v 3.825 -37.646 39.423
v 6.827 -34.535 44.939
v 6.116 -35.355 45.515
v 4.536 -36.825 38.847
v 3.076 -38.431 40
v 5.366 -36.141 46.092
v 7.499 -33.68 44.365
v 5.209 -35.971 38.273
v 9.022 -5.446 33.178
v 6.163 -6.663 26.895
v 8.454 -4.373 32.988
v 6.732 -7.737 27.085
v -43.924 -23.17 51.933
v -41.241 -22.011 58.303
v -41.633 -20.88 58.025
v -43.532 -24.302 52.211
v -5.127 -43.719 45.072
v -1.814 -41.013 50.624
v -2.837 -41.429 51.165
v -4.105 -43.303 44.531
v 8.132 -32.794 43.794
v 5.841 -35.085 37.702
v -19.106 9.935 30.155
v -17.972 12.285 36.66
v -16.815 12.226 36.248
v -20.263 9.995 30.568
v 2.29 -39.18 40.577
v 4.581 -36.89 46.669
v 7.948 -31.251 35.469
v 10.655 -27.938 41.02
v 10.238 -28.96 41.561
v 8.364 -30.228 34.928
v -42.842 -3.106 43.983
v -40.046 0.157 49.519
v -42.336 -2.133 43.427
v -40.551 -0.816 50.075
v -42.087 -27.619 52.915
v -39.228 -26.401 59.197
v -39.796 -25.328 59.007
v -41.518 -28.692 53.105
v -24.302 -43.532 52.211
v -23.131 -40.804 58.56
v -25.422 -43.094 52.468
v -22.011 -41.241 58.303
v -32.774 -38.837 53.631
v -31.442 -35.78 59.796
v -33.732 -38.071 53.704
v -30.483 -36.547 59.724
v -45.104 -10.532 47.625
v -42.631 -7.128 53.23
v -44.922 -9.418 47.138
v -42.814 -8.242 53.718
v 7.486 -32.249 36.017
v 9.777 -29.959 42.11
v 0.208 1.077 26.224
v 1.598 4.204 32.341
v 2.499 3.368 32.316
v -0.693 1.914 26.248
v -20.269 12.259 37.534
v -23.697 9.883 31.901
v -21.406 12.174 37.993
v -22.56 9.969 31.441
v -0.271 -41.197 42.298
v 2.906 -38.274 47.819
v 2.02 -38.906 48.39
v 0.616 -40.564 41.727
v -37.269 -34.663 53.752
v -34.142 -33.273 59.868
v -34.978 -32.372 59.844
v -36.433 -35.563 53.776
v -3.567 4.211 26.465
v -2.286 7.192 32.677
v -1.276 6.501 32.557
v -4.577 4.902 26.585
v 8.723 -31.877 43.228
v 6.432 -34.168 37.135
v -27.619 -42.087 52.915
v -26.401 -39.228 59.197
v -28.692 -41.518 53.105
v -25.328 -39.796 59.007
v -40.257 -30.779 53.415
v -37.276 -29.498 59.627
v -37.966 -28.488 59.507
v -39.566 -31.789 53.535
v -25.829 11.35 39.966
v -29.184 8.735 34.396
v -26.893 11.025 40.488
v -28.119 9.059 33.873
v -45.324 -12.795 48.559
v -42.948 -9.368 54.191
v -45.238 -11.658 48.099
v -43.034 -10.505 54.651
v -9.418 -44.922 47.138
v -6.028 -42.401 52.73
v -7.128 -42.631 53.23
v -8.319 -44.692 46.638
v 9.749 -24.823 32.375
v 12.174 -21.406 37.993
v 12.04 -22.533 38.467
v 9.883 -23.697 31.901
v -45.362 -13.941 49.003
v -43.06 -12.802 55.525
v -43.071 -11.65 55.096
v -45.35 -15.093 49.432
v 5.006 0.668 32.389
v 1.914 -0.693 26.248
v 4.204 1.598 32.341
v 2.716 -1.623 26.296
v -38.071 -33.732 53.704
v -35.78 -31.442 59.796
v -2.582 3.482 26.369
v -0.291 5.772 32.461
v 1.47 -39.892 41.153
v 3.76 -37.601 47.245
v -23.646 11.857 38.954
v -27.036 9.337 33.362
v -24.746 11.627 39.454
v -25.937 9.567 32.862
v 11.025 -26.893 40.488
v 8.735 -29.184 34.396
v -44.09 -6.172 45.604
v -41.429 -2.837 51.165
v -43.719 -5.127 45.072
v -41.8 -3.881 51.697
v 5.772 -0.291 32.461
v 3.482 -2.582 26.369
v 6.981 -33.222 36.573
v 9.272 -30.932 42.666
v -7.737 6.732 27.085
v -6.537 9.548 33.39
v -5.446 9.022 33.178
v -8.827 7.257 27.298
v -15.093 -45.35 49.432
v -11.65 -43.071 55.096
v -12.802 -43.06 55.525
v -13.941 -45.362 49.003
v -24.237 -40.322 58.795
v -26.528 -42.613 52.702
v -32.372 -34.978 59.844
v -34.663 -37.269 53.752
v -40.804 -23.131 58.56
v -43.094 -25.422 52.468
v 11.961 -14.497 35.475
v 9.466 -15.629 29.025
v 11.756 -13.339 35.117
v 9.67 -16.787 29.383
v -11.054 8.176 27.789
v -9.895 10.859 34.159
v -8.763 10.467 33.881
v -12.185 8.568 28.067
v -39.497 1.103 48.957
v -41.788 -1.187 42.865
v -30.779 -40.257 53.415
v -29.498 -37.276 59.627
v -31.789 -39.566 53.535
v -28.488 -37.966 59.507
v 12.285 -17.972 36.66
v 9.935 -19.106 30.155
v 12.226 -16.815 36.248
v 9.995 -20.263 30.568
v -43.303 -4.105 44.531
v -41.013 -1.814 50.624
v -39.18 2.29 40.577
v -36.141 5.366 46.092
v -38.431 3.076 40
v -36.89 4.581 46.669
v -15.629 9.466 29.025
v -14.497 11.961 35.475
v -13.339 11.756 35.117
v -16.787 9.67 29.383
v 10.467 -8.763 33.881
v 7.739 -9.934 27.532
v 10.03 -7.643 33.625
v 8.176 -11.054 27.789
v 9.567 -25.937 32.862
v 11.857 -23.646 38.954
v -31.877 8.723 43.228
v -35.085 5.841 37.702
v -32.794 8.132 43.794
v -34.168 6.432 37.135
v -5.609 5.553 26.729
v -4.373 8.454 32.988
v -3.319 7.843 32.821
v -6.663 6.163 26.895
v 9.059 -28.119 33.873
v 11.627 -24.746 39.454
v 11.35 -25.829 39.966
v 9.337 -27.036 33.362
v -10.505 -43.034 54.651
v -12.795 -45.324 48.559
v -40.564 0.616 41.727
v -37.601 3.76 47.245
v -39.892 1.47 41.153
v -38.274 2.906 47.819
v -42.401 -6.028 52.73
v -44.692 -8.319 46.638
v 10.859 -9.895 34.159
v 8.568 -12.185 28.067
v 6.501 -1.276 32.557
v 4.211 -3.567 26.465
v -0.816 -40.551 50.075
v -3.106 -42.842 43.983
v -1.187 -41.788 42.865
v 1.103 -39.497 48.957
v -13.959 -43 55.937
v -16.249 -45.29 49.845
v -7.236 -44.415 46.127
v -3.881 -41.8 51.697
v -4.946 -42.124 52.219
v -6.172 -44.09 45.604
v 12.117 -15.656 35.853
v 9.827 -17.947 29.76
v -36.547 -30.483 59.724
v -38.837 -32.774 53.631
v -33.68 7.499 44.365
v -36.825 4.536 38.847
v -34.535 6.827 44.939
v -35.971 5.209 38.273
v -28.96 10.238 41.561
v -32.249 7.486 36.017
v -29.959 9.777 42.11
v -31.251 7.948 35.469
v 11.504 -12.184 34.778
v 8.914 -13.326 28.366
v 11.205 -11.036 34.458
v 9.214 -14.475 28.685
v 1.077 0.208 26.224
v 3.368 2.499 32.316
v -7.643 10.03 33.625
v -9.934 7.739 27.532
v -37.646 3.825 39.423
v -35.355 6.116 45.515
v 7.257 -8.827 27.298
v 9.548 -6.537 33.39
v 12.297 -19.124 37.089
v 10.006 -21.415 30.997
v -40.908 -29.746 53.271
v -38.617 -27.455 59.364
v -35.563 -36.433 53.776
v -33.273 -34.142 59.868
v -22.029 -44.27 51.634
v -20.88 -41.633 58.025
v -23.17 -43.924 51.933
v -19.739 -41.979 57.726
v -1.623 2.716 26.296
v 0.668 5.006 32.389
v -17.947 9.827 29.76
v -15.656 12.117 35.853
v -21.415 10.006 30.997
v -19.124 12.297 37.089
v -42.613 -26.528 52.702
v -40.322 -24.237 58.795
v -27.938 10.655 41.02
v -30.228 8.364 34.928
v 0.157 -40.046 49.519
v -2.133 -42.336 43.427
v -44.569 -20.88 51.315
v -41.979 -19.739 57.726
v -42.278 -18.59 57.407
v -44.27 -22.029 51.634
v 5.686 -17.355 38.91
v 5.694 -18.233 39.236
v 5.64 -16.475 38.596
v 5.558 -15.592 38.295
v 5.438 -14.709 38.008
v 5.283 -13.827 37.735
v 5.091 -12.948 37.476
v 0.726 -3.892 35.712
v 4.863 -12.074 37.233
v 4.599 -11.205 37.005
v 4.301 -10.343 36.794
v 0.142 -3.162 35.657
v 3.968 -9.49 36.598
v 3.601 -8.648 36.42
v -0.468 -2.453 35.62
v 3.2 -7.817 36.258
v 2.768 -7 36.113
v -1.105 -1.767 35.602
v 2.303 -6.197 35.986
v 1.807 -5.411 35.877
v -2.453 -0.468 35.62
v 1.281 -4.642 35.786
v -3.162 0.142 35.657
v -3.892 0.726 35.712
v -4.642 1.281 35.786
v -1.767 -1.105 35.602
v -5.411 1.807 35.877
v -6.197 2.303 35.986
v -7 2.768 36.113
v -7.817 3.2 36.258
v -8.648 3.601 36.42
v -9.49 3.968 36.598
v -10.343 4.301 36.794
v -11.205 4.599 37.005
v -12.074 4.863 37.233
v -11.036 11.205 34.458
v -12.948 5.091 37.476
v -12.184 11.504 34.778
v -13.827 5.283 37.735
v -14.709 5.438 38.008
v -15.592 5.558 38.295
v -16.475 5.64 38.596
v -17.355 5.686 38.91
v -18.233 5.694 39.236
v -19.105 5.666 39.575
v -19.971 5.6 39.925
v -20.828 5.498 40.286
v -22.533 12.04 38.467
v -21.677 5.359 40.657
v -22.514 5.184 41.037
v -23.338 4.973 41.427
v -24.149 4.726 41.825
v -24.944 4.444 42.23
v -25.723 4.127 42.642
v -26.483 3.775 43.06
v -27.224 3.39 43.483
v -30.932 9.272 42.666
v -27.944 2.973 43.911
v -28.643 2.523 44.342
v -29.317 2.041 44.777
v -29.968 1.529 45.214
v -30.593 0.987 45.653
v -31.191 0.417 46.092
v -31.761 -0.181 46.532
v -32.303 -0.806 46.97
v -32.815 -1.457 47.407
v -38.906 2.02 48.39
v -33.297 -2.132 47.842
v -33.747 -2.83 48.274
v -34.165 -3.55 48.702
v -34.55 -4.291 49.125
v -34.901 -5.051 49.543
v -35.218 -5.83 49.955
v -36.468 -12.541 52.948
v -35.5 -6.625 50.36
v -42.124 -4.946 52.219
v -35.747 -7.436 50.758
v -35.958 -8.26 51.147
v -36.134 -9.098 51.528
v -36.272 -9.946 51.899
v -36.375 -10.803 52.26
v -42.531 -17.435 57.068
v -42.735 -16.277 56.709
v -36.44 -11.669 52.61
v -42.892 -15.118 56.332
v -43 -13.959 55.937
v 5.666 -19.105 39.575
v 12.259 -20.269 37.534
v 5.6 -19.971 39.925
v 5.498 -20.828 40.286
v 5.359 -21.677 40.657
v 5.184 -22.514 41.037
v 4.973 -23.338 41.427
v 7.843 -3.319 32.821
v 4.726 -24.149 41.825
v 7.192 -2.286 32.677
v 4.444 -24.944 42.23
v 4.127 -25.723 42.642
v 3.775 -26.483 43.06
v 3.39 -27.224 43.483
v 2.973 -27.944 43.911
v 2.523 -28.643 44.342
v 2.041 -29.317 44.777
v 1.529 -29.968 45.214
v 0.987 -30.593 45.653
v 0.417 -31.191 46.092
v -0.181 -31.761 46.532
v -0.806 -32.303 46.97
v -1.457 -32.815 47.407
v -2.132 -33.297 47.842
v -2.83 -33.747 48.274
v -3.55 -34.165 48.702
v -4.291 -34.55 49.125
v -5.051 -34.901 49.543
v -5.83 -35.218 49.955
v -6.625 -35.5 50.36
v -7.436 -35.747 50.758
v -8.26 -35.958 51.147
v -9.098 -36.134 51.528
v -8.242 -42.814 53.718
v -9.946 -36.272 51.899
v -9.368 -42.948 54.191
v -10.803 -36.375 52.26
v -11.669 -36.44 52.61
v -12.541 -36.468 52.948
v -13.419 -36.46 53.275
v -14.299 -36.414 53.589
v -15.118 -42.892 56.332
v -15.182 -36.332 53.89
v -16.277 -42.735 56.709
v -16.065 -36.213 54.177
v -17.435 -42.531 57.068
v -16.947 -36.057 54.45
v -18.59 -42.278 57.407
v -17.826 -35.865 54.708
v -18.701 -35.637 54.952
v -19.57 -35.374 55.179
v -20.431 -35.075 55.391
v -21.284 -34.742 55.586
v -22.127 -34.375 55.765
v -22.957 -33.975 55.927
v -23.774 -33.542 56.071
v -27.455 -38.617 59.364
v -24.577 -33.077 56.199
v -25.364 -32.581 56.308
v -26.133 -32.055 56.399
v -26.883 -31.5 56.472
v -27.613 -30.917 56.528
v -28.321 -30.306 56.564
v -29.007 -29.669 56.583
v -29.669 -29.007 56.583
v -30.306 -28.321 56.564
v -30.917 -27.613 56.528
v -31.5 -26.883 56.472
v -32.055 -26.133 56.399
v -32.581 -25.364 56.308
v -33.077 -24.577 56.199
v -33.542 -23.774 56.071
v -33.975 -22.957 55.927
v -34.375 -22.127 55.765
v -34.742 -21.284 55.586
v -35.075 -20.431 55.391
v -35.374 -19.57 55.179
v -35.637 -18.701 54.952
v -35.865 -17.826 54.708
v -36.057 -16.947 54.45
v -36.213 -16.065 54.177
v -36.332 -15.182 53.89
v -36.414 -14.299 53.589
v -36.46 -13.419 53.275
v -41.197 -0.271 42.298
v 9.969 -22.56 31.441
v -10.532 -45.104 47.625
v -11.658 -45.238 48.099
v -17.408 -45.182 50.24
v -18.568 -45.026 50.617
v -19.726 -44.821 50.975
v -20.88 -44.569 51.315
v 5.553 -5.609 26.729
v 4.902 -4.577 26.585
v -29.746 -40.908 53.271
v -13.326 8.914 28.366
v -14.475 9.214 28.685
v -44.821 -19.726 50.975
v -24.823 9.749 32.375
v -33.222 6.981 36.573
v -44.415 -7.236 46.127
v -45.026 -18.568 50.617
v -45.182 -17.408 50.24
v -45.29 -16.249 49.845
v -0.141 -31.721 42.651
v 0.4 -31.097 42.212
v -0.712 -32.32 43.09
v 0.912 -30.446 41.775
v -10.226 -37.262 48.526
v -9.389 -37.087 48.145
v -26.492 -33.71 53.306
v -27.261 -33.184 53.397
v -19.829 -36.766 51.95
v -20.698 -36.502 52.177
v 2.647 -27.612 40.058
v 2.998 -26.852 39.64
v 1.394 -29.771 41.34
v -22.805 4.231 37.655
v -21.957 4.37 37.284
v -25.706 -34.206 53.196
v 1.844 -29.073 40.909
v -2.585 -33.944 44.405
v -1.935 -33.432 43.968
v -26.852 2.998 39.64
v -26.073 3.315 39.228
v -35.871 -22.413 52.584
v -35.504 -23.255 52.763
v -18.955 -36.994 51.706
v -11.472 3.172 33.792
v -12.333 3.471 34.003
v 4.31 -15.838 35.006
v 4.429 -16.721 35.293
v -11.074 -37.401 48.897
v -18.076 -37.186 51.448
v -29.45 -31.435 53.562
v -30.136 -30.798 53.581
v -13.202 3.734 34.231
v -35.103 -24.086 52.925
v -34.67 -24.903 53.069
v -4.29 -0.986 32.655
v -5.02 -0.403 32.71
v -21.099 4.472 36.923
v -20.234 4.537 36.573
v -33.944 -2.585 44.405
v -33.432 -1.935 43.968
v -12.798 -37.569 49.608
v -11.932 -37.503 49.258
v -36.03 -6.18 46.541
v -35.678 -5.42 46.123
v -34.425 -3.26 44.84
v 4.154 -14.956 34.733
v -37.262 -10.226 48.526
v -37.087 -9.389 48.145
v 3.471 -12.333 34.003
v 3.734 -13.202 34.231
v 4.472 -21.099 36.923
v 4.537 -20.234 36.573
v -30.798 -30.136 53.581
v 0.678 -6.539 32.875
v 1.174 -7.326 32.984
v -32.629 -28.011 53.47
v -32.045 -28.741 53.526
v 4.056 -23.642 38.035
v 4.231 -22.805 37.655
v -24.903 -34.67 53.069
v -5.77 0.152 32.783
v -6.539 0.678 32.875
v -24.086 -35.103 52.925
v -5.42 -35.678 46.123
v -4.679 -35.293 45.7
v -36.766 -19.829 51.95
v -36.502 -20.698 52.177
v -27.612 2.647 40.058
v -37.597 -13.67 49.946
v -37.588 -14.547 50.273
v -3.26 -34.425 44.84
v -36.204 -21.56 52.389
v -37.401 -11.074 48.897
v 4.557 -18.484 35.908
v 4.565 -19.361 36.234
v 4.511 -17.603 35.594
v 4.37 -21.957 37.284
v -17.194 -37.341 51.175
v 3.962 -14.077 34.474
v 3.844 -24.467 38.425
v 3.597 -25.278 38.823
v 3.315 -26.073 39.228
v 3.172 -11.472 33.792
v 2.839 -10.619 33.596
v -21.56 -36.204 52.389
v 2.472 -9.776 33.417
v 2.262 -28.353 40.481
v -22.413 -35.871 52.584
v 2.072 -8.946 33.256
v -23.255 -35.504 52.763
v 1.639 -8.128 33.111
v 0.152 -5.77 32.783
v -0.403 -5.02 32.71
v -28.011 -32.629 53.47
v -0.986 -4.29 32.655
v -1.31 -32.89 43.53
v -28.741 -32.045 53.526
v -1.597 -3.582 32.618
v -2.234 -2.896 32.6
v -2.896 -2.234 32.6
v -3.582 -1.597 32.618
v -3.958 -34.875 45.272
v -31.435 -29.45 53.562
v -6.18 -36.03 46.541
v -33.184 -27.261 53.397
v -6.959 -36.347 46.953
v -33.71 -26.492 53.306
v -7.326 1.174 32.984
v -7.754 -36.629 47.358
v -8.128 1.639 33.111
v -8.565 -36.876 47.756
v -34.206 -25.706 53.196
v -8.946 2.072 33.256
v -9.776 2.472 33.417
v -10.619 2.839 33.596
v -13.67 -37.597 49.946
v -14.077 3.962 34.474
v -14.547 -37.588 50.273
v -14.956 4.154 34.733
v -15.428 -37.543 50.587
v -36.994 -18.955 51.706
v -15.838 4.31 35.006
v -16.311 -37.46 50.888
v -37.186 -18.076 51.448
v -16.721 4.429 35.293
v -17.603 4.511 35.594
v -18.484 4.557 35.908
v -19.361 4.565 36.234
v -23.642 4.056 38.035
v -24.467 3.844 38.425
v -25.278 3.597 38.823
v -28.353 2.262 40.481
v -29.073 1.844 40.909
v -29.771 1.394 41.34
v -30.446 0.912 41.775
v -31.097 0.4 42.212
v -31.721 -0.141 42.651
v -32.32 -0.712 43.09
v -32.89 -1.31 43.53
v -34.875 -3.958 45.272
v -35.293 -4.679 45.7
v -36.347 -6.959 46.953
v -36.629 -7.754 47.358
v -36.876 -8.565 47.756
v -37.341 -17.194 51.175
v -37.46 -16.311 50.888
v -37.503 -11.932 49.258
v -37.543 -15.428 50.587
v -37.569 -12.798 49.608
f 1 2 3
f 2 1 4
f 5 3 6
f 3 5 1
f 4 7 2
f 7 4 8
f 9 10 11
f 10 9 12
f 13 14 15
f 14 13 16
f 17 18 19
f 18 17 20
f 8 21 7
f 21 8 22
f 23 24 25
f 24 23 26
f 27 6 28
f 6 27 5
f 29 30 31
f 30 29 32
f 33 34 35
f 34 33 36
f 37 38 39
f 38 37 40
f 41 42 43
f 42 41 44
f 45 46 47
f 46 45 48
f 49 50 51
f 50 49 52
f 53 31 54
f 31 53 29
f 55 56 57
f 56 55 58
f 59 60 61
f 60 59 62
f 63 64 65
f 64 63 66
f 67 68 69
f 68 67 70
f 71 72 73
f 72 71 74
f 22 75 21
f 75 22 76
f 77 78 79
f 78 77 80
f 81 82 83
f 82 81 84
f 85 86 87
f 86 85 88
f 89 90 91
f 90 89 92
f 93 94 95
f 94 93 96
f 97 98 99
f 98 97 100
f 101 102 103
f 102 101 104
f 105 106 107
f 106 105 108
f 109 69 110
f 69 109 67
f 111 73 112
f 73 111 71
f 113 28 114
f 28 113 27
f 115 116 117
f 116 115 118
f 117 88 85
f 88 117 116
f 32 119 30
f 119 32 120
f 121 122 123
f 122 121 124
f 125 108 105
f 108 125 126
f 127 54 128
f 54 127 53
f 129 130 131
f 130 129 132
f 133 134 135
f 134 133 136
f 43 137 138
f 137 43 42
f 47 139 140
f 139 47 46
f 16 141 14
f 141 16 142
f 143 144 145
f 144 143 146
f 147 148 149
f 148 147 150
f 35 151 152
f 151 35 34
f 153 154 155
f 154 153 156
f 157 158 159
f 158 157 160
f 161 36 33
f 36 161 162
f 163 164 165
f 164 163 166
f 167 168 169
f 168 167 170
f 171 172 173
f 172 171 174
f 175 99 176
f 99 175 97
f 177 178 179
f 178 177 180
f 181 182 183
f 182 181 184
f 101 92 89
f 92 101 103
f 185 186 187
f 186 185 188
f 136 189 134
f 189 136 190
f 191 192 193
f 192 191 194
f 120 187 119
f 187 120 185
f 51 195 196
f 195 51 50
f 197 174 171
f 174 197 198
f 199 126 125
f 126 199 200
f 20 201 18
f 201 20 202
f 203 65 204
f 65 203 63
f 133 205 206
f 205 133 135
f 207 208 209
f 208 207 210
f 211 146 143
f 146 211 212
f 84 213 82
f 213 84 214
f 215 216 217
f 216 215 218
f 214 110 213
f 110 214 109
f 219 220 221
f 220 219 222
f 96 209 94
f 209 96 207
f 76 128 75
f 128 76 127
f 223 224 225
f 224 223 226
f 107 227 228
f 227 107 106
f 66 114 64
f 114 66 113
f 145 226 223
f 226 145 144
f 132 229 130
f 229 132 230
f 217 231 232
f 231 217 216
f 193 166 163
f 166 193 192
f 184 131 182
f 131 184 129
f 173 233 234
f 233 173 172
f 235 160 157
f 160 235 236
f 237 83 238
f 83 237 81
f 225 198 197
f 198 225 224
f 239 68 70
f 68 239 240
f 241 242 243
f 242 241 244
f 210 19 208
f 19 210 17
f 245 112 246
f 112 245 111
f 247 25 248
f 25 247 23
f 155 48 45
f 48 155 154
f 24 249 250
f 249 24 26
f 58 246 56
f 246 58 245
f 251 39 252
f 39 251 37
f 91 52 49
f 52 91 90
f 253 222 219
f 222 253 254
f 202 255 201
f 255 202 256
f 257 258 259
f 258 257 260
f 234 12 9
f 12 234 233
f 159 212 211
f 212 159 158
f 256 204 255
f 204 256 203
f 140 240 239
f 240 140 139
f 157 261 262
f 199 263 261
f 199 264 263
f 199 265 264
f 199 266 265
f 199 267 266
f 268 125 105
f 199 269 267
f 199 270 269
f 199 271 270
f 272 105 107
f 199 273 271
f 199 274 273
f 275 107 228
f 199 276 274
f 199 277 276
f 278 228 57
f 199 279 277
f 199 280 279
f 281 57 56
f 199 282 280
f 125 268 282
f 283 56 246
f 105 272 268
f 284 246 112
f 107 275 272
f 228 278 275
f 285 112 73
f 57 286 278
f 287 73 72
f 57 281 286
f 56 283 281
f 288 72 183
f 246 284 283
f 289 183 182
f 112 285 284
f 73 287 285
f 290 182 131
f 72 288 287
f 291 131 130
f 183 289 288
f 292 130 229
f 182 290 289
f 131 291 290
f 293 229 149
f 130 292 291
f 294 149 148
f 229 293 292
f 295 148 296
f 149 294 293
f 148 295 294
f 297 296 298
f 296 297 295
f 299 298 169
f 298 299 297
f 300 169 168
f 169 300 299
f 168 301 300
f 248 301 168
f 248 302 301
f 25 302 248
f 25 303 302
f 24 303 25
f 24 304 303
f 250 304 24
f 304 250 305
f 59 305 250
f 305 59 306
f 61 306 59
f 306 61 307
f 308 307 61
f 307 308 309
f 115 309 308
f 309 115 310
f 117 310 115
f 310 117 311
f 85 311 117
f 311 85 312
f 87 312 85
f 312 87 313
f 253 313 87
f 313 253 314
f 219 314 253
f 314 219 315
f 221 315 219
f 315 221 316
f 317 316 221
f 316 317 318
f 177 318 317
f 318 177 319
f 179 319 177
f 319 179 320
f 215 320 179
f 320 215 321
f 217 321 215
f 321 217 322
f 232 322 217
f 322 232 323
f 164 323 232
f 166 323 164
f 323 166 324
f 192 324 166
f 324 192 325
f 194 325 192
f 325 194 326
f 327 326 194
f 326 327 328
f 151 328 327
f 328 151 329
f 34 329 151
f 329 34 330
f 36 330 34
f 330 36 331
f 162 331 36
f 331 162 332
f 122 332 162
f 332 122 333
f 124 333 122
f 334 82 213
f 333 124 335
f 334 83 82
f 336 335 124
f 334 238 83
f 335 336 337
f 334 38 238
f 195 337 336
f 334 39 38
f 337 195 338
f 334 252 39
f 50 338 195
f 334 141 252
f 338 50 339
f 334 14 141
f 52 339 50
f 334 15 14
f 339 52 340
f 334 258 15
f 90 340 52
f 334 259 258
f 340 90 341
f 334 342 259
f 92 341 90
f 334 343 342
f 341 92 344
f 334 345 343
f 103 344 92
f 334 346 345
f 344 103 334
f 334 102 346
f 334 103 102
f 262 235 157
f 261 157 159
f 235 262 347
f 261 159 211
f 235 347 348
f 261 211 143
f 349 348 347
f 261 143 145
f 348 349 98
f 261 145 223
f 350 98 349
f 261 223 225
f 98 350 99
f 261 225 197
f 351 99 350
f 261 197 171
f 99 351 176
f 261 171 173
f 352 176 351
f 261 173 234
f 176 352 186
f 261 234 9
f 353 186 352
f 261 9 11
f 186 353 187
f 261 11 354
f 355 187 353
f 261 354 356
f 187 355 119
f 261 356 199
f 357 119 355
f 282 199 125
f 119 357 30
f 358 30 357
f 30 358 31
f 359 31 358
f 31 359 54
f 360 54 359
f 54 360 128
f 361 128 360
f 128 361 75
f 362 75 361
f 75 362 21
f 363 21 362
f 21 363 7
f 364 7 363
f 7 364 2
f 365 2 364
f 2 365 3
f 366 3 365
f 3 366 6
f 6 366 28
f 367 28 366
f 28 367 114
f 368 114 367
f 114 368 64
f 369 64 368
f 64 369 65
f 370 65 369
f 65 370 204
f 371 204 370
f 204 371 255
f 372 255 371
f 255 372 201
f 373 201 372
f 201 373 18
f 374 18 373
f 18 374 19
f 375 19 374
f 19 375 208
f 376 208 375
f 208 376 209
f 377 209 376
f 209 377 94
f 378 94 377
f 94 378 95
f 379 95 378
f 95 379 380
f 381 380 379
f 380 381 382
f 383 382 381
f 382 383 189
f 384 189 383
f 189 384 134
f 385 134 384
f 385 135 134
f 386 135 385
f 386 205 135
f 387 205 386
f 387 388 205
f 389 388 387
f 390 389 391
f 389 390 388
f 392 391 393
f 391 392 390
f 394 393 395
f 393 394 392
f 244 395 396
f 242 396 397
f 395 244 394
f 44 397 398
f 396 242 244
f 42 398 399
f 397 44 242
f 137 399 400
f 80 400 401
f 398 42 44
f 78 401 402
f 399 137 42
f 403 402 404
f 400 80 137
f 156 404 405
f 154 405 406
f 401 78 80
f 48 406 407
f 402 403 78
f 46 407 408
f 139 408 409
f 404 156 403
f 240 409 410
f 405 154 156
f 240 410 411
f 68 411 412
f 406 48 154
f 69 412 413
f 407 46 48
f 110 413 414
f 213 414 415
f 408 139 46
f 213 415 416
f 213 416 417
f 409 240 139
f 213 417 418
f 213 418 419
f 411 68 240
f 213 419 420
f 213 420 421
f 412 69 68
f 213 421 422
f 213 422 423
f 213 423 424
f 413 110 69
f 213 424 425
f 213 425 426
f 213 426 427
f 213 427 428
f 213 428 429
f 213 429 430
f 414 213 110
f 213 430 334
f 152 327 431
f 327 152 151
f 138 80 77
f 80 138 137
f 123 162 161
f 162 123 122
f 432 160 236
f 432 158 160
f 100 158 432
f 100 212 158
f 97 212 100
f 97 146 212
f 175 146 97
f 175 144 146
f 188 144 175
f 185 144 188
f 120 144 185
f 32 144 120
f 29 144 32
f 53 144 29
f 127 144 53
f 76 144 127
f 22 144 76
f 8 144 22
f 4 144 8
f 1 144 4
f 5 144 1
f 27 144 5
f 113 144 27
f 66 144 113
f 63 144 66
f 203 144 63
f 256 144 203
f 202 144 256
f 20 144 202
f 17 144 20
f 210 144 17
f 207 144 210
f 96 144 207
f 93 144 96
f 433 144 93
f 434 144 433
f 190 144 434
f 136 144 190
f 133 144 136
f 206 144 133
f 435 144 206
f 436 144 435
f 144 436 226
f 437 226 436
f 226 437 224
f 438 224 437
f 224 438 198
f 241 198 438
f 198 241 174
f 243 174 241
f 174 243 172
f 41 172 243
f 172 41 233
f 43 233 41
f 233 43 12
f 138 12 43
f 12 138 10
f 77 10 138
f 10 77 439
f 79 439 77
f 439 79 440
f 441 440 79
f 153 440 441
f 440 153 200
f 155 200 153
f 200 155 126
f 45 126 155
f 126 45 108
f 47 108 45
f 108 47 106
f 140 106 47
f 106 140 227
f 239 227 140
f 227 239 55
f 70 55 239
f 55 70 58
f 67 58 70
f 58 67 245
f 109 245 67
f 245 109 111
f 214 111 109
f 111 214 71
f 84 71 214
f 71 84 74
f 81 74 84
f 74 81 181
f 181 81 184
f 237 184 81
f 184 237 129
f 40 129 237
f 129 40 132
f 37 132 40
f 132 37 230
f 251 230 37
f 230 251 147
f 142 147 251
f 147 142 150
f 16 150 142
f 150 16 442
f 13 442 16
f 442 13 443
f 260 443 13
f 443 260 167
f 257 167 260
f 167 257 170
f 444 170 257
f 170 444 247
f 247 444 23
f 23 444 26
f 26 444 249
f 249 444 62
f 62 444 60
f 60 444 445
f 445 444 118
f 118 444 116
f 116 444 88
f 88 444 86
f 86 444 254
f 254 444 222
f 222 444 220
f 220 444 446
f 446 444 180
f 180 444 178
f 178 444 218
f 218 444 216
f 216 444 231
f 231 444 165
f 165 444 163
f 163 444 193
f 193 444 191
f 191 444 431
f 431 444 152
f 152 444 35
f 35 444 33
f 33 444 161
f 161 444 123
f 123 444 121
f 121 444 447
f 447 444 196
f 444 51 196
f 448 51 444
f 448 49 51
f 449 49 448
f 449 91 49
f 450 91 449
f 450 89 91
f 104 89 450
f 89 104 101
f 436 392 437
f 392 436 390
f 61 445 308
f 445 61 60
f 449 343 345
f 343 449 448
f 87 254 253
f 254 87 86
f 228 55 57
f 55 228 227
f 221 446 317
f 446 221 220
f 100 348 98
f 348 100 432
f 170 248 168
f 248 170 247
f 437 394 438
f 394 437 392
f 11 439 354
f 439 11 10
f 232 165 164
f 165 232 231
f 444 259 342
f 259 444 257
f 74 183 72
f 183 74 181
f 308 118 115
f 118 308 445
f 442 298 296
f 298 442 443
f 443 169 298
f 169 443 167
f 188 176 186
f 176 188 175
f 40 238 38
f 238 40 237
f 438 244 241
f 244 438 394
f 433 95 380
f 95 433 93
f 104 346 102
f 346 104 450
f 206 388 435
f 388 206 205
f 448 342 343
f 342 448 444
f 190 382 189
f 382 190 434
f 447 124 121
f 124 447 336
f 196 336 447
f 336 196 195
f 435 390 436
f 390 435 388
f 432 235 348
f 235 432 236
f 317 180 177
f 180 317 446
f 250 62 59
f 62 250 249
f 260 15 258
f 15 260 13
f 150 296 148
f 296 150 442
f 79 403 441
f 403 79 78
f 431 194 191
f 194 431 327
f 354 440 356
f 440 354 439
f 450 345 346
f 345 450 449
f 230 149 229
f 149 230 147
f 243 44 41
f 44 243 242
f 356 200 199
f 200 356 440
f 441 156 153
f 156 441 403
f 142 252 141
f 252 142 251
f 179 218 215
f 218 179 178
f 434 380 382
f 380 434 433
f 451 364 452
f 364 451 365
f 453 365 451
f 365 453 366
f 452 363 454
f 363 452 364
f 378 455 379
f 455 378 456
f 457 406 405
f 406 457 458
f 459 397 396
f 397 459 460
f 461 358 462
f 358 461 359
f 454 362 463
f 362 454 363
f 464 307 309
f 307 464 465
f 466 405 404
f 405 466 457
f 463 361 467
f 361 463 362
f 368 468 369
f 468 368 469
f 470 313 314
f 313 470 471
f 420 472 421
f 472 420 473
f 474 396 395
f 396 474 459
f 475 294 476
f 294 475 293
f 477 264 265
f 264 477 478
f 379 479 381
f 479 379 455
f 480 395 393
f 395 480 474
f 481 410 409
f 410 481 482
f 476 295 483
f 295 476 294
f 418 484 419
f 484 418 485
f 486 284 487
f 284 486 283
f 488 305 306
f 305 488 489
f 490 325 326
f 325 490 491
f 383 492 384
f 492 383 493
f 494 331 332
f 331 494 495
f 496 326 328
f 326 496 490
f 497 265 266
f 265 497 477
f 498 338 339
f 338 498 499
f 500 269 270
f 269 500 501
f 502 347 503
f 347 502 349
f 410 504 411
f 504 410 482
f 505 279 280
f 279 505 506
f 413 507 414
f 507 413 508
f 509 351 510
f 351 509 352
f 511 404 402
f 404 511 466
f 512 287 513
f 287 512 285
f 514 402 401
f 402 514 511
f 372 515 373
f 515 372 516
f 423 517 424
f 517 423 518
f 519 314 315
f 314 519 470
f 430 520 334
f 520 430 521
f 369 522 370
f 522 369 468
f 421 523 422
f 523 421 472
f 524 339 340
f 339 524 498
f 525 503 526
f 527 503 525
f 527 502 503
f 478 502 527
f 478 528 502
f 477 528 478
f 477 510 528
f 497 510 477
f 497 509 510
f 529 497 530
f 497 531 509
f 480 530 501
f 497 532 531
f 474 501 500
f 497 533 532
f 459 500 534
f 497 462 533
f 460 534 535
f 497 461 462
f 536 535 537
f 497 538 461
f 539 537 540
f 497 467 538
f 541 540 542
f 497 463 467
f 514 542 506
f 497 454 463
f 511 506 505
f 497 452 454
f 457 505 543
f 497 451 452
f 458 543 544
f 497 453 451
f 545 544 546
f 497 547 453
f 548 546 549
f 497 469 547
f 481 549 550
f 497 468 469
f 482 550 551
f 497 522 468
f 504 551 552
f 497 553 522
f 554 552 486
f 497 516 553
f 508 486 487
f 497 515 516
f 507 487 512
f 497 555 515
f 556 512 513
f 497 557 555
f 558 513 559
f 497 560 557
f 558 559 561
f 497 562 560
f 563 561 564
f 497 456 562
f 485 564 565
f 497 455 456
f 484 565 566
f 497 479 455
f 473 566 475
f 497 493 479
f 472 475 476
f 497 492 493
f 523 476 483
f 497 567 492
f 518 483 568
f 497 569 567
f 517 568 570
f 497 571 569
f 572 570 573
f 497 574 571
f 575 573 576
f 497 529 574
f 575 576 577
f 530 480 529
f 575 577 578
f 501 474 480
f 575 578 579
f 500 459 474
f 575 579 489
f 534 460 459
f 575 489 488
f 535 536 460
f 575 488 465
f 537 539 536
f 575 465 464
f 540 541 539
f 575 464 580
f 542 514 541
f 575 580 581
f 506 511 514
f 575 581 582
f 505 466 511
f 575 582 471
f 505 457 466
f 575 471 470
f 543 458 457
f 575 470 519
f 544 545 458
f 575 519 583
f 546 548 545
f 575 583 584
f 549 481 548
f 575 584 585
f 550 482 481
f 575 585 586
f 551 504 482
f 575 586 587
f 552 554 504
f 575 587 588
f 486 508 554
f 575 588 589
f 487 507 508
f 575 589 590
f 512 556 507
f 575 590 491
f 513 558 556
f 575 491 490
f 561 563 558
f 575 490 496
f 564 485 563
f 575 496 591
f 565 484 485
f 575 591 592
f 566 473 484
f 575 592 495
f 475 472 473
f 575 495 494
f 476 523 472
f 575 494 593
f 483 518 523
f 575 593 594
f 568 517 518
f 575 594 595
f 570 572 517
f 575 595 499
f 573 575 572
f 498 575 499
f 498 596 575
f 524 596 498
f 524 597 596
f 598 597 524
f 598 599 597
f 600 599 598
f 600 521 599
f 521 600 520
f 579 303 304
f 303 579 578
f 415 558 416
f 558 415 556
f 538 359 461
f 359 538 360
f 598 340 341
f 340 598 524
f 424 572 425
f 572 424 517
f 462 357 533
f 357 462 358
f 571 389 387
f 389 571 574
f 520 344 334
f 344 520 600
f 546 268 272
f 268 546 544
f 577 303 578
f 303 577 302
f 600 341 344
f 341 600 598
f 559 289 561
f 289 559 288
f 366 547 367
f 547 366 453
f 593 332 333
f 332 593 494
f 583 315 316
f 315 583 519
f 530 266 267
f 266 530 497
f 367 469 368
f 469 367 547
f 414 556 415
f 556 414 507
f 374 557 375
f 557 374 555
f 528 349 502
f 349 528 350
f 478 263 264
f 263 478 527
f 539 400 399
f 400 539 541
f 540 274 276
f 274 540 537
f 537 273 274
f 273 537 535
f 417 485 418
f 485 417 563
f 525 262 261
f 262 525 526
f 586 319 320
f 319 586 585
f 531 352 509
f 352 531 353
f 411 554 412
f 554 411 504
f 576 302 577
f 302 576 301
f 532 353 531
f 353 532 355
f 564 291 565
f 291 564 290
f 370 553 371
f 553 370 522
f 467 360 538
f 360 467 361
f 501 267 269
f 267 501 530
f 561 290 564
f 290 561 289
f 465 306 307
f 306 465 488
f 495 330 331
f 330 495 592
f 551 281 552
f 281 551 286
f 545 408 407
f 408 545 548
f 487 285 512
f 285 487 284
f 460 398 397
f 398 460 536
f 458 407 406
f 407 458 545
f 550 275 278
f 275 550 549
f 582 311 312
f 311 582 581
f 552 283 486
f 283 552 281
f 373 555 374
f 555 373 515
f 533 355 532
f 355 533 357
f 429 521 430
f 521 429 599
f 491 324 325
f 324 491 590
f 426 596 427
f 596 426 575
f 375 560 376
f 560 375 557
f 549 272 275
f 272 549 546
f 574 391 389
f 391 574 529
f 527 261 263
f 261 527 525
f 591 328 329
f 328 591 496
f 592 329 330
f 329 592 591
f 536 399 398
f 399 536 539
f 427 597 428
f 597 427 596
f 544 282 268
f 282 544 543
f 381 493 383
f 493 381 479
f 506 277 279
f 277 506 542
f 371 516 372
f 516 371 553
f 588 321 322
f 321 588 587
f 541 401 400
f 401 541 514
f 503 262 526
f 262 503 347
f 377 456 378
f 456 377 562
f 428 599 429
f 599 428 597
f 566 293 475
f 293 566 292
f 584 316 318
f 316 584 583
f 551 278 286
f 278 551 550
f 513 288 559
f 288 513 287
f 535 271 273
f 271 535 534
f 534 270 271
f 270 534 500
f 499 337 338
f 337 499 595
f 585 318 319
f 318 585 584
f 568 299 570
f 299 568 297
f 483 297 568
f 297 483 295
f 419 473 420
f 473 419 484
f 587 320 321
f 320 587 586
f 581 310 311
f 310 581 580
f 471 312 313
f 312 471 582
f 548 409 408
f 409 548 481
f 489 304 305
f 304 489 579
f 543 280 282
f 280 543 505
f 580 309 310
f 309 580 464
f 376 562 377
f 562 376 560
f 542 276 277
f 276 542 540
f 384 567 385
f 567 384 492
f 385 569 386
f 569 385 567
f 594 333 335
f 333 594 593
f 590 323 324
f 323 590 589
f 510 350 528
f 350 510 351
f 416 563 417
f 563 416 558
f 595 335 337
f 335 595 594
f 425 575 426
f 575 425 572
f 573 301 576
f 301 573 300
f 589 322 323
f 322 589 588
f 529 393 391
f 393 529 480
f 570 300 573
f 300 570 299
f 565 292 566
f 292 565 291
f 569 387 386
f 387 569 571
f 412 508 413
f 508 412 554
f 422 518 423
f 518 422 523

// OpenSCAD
CUBE_SIZE=80;
LETTER_THICK=15;

ANNIVERSARY_COIN_DIAMETER= 44.7;
ANNIVERSARY_COIN_THICK = 3.4;

$fn=150;

// Letter will go up in +Z, out in +Y, thick in -X
module LetterL(letterHeight, letterWidth, letterThick, curveRadius)
{
  // Straight length parts (not the curve, not the rounded end)
  straightLengthBottom = letterWidth - curveRadius - letterThick / 2;
  straightLengthTop    = letterHeight - curveRadius - letterThick / 2;
  
  // Bottom part
  translate([-letterThick, curveRadius, 0])
    cube([letterThick, straightLengthBottom, letterThick]);
  
  translate([-letterThick, curveRadius + straightLengthBottom, letterThick / 2])
    rotate(a=90, v=[0,1,0])
      cylinder(h=letterThick, r=(letterThick / 2)); 
  
  // Top part
  translate([-letterThick, 0, curveRadius])
    cube([letterThick, letterThick, straightLengthTop]);
  
  translate([-letterThick, letterThick / 2, curveRadius + straightLengthTop])
    rotate(a=90, v=[0,1,0])
      cylinder(h=letterThick, r=(letterThick / 2));
  
  // Big radius
  intersection()
  {
    translate([-letterThick, 0, 0])
      cube([letterThick, curveRadius + .0001, curveRadius + .0001]);
    
    difference()
    {
    translate([-letterThick, curveRadius, curveRadius])
      rotate(a=90, v=[0,1,0])
        cylinder(h=letterThick, r=curveRadius);
      
    translate([-letterThick-.5, curveRadius, curveRadius])
      rotate(a=90, v=[0,1,0])
        cylinder(h=letterThick+1, r=curveRadius - letterThick);
      
    }    
  }
}


module LetterC(letterSize, letterThick, curveRadius) 
{
  // Letter will be in Y and Z planes.  Thickness from X=0 towards negative X.
  bottomHeight = letterSize / 2 + letterThick;
  LetterL(bottomHeight, letterSize, letterThick, curveRadius);
  
  translate([-letterThick, 0, letterSize])
    rotate(a=180, v=[0,1,0])
      LetterL(bottomHeight, letterSize, letterThick, curveRadius);
  
}

module LetterS(letterSize, letterThick, curveRadius) 
{
  // There are 4 L's in an S (top, left, right, bottom)
  // top and bottom are the same size
  // left and right are the same size
  
  TB_width = curveRadius + letterThick / 2 + .1;
  TB_height = letterSize;
  
  translate([0, letterSize, 0])
    rotate(a=90, v=[1,0,0])
      LetterL(TB_height, TB_width, letterThick, curveRadius);
  
  translate([0, 0, letterSize])
    rotate(a=90, v=[-1,0,0])
      LetterL(TB_height, TB_width, letterThick, curveRadius);
  
  LR_width = letterSize / 2 + letterThick / 2 + .001;
  LR_height = curveRadius + letterThick / 2 + .001;
  
  translate([0,0,letterSize/2 - letterThick / 2])
  LetterL(LR_height, LR_width, letterThick, curveRadius);
  
  translate([0, letterSize, letterSize / 2 + letterThick / 2])
  rotate(a=180, v=[1,0,0])
  LetterL(LR_height, LR_width, letterThick, curveRadius);
  
  // There are also little sections that join bottom to the LR, and top to the LR
  littleSectsHeight = (letterSize - ( curveRadius * 4 - letterThick) ) / 2;
  echo("Little Sects Height = ", littleSectsHeight);
  
  translate([-letterThick, letterSize - letterThick, curveRadius])
    cube([letterThick, letterThick, littleSectsHeight]);
    
  translate([-letterThick, 0, letterSize / 2 - letterThick / 2 + curveRadius])
    cube([letterThick, letterThick, littleSectsHeight]);
  
}

// Just goes up +z
module LetterLittleI(letterSize, letterThick)
{
  // Going to have 3/5 of letter be stick part of i
  // Then on top of that a ball
  
  stickLen = letterSize / 5 * 3;
  stickCubeLen = stickLen - letterThick;
  
  // cube part of stick
  translate([-letterThick, 0, letterThick / 2])
    cube([letterThick, letterThick, stickCubeLen]);
  
  // bottom rounded part of stick
  translate([-letterThick, letterThick / 2, letterThick / 2])
    rotate(a=90, v=[0,1,0])
      cylinder(h=letterThick, r=letterThick / 2);
  
  translate([-letterThick, letterThick / 2,  + stickCubeLen + letterThick / 2])
    rotate(a=90, v=[0,1,0])
      cylinder(h=letterThick, r=letterThick / 2);

  translate([-letterThick, letterThick / 2, stickLen + letterThick * 2 / 5])
  rotate(a=90, v=[0,1,0])
    cylinder(h=letterThick, r=letterThick / 2);

}

module CoinHolder(coinDiameter, coinThick)
{
  COIN_WALL_THICK=3.5;
  
  
  
  difference()
  {
    cylinder(h=coinThick + COIN_WALL_THICK, r=coinDiameter / 2 + 2 * COIN_WALL_THICK);
    
    translate([0,0,COIN_WALL_THICK])
    cylinder(h=coinThick + 1, r=coinDiameter / 2);
  }
}

module graphicLogo(xSize, ySize, zSize)
{
  resize([xSize,ySize,zSize])
  intersection()
  {
    translate([0,0,50])
      surface(file="si-2d-grey.png", invert=true);
    
    cube([100,100,10]);
  }
  
  //import("old_logo.stl");
}

module CoinPodium()
{
  translate([-CUBE_SIZE / 2, CUBE_SIZE / 2, 42])
      rotate(a=45, v=[0,0,-1])
        rotate(a=28, v=[-1,0,0])
          CoinHolder(ANNIVERSARY_COIN_DIAMETER, ANNIVERSARY_COIN_THICK);
    
    
    OLD_LOGO_WIDTH=20;
    
    translate([-20,-20,0])
    
    translate([0,CUBE_SIZE,0])
    
    
    rotate(135, [0,0,-1])
    translate([0,OLD_LOGO_WIDTH/2,0])
      rotate(90, [1,0,0])
        graphicLogo(50,50,OLD_LOGO_WIDTH);
  
}

module CoinPodium2(coinDiameter, coinThick)
{
  COIN_ANGLE=28;
  LOGO_SIZE=50;
  
  
  translate([-sin(45)* LOGO_SIZE / 2, -sin(45) * LOGO_SIZE / 2, 40])
      rotate(a=45, v=[0,0,-1])
        rotate(COIN_ANGLE, v=[-1,0,0])
          CoinHolder(coinDiameter, coinThick);
    
    
    OLD_LOGO_WIDTH=20;
    
    //translate([-20,-20,0])
    
    //translate([0,CUBE_SIZE,0])
    
    
    rotate(135, [0,0,-1])
    translate([0,OLD_LOGO_WIDTH/2,0])
      rotate(90, [1,0,0])
        graphicLogo(50,50,OLD_LOGO_WIDTH);
  
}

module Logo3d(printCoinHolder)
{
  if (printCoinHolder != 0)
  {
    CoinPodium();
  }

  LetterC(CUBE_SIZE, LETTER_THICK, 20);

  translate([-CUBE_SIZE, CUBE_SIZE, CUBE_SIZE - LETTER_THICK])
  rotate(a=90, v=[0,1,0])
  rotate(a=90, v=[1,0,0])
  LetterLittleI(CUBE_SIZE, LETTER_THICK);

  translate([0, CUBE_SIZE, 0])
    rotate(a=90, v=[0,0,1])
      LetterS(CUBE_SIZE, LETTER_THICK, 20);
}

// Rotate letter for better printing
//rotate(a=90, v=[-1,0,0])
//resize([35,35,35])
//  Logo3d(0);     // Change the 0 to a 1 to print the coin holder part

//translate([5,5,0])
//translate([0,-40,0])
CoinPodium2(44.7, 3.4);

//graphicLogo();



//rotate(135,[0,0,1])
//translate([0,2.5,0])
//rotate(90,[1,0,0])

        //graphicLogo();
